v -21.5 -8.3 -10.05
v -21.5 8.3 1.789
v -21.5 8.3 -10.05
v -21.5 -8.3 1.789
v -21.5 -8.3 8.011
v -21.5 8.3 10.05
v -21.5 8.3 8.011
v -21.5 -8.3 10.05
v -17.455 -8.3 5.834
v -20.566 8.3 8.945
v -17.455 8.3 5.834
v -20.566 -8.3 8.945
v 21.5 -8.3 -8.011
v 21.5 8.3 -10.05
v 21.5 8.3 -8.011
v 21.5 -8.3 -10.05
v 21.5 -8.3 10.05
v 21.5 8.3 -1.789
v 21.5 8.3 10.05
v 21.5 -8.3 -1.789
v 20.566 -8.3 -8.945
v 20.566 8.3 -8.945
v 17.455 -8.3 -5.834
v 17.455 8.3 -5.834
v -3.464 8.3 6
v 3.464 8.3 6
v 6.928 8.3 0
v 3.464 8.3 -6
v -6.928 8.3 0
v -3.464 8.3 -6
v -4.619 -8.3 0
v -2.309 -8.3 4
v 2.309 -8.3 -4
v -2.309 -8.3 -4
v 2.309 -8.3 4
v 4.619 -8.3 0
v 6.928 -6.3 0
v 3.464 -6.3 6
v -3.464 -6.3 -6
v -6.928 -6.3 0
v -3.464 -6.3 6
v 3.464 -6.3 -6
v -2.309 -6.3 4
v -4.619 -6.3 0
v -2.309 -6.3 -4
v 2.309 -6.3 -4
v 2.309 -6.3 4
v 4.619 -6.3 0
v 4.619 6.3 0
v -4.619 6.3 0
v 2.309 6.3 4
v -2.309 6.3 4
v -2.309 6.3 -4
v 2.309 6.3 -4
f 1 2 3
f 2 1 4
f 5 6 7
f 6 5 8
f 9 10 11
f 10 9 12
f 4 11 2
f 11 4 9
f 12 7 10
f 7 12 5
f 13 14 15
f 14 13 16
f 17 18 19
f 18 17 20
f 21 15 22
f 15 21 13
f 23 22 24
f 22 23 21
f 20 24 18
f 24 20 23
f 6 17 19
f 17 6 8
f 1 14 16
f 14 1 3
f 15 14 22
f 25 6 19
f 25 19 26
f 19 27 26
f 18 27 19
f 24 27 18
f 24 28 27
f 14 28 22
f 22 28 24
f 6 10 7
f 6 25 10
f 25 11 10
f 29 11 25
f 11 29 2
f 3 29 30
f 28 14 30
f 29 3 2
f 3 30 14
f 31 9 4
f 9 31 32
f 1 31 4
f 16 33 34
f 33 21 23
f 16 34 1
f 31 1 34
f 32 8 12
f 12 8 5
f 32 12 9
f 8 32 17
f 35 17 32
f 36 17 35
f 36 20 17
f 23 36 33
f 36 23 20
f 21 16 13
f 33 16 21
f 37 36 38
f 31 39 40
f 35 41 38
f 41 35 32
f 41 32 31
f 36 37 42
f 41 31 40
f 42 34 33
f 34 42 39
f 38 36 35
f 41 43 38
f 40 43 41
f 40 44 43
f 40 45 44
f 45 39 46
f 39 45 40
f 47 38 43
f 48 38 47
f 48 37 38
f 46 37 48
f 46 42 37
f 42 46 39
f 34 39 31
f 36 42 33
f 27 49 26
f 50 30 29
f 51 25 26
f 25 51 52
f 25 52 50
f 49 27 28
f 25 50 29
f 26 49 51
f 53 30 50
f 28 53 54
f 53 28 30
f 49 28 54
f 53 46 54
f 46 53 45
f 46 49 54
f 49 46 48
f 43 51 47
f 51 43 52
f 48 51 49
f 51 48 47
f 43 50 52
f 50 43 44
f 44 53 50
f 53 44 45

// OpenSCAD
$fn=96;

L = 55.0;
W = 16.6;
H = 20.1;

end_relief_len = 6.0;
end_chamfer = 2.2;

hex_flat = 8.0;
hex_r = hex_flat / sqrt(3);

cs_depth = 2.0;
cs_extra_flat = 4.0;
cs_flat = hex_flat + cs_extra_flat;
cs_r = cs_flat / sqrt(3);

hole_x = 0;

module bar_body() {
    difference() {
        cube([L, W, H], center=true);

        for (sx = [-1, 1]) {
            translate([sx*(L/2 - end_relief_len/2), 0, 0])
                cube([end_relief_len, W + 0.6, H + 0.6], center=true);

            translate([sx*(L/2 - end_chamfer/2), 0, 0])
                rotate([0, 45, 0])
                    cube([end_chamfer*2, W + 0.8, H + 0.8], center=true);
        }
    }
}

module hex_through_with_v_countersink() {
    union() {
        translate([hole_x, 0, 0])
            rotate([90, 0, 0])
                cylinder(h=W + 1.0, r=hex_r, center=true, $fn=6);

        for (sy = [-1, 1]) {
            translate([hole_x, sy*(W/2 - cs_depth/2), 0])
                rotate([90, 0, 0])
                    cylinder(h=cs_depth, r1=cs_r, r2=hex_r, center=true, $fn=6);
        }
    }
}

difference() {
    bar_body();
    hex_through_with_v_countersink();
}
